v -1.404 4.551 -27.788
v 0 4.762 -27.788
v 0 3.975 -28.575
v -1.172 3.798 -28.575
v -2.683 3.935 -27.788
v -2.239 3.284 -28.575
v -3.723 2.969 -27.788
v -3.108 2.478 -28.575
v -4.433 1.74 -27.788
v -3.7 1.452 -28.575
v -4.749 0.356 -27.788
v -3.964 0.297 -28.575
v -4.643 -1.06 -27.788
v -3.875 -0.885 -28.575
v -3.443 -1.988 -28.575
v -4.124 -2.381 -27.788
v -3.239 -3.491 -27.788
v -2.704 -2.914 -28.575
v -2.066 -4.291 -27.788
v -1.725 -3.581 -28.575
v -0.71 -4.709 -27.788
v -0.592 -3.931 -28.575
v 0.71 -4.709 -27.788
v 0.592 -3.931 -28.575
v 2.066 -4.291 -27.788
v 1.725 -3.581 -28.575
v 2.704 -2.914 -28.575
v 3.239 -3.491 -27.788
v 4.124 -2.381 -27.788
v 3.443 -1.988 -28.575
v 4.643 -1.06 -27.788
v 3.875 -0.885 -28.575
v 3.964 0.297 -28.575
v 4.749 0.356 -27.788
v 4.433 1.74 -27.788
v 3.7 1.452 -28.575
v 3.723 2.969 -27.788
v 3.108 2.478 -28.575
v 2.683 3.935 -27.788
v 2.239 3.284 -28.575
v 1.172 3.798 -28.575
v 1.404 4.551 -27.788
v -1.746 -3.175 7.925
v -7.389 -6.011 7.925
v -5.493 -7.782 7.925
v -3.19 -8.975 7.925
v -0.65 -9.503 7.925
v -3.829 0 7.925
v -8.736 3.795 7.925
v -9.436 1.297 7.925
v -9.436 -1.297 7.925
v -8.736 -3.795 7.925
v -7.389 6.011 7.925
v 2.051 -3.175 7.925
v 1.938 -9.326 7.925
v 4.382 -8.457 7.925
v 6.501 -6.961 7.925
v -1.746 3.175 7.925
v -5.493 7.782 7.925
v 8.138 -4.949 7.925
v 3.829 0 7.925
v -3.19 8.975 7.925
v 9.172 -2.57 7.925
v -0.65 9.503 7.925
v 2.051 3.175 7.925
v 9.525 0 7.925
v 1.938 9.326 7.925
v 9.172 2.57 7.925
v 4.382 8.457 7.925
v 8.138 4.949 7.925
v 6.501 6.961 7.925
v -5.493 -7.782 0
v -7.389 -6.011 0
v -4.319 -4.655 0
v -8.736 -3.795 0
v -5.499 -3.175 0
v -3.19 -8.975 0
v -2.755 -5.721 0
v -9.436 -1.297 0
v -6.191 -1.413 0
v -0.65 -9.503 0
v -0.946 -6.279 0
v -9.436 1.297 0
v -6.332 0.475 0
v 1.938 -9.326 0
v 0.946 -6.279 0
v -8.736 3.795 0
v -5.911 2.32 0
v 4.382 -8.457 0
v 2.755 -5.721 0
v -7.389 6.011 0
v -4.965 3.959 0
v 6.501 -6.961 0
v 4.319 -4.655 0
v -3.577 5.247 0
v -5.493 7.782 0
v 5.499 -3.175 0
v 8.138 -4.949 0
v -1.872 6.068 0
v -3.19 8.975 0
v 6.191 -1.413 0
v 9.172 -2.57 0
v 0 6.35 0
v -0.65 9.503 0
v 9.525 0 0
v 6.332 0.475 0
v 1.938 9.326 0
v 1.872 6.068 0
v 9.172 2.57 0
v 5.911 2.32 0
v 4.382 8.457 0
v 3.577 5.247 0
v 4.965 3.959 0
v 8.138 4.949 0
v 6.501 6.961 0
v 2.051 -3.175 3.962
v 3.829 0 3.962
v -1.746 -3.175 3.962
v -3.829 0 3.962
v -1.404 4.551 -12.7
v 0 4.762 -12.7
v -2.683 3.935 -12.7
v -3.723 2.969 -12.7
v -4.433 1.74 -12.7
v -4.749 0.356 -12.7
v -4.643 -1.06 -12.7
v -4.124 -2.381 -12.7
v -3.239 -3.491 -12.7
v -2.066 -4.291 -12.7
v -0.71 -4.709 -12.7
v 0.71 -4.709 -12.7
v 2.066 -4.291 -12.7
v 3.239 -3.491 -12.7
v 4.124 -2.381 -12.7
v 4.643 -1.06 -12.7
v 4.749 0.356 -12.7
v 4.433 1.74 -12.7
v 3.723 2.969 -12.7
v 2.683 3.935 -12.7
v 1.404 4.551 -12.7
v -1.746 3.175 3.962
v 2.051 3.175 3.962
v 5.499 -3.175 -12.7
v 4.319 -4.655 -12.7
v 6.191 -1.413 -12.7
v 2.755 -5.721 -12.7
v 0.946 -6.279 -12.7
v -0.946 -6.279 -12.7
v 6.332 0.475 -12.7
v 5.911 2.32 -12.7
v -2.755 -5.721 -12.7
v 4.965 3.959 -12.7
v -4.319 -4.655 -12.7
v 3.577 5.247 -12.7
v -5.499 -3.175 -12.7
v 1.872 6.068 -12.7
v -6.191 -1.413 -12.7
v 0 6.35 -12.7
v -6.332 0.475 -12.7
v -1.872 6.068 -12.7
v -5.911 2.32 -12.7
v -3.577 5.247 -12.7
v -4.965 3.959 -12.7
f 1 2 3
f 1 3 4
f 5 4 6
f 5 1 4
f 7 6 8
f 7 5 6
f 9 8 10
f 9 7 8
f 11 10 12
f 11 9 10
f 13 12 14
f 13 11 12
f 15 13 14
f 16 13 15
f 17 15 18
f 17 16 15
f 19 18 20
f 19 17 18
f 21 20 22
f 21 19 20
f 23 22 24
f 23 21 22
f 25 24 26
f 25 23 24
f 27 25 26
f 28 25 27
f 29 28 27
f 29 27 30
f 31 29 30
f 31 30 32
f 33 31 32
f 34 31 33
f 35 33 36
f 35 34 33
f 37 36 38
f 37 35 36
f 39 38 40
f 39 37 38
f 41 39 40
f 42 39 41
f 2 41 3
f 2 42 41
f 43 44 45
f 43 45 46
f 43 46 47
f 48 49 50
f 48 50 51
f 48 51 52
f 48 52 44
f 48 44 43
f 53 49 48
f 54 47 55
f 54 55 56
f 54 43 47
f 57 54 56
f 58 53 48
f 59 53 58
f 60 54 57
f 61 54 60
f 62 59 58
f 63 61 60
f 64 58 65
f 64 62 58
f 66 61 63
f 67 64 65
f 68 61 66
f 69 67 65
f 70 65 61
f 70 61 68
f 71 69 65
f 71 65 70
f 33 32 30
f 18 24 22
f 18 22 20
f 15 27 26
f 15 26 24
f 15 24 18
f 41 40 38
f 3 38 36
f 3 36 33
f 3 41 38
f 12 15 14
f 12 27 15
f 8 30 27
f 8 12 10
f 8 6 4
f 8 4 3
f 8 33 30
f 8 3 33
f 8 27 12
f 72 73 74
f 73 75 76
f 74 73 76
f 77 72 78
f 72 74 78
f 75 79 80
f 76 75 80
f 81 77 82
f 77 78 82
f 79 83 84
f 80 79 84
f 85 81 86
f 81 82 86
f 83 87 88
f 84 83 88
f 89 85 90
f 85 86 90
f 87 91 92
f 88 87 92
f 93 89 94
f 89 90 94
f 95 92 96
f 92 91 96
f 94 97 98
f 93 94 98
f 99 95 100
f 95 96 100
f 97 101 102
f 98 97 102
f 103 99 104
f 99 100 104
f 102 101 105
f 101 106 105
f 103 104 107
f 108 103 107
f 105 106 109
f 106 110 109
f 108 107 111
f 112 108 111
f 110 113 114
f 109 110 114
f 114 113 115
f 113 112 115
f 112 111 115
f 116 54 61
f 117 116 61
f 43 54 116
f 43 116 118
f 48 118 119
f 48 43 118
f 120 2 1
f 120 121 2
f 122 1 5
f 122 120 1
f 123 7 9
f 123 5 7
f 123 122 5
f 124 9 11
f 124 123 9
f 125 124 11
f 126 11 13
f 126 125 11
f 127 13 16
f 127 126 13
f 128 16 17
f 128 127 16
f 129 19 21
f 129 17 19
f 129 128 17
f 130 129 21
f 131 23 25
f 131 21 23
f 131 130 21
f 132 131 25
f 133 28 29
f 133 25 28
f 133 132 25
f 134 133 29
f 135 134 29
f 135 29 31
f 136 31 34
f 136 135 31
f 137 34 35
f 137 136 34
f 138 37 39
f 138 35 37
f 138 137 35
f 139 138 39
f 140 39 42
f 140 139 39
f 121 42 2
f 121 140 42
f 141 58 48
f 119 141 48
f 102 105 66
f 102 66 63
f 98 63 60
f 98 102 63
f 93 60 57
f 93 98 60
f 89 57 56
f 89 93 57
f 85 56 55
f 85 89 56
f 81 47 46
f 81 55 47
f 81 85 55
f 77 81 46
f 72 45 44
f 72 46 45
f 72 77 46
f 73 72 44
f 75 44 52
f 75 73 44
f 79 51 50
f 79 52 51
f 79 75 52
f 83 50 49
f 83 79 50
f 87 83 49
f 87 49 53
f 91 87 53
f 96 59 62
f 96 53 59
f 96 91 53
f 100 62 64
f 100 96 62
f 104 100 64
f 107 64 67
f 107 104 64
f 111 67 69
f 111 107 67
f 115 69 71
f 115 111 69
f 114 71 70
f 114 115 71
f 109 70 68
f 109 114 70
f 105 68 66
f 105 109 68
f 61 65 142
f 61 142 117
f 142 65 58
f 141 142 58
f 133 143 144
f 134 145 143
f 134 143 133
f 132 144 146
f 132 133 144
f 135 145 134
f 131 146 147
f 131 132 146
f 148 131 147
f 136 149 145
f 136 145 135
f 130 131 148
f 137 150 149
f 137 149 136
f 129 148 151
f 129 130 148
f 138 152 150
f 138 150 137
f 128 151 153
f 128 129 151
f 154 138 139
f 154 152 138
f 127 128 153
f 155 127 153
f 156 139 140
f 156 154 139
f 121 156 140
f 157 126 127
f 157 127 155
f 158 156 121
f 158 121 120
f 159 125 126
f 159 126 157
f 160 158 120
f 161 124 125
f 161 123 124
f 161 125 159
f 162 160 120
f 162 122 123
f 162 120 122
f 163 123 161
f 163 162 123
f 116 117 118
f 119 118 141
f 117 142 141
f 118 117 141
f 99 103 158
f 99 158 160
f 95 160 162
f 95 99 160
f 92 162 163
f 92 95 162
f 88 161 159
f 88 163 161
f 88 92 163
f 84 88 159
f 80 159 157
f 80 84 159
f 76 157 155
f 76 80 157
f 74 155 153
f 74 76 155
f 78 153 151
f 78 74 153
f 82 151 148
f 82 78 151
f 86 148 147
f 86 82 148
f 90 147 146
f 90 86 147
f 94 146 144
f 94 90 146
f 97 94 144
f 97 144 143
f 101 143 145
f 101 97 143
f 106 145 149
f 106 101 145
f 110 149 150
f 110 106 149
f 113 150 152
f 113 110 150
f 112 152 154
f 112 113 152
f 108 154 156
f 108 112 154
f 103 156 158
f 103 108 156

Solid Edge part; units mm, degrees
sketch "Sketch1" plane through (0, 0, 0) normal (0, 0, 1) x (1, 0, 0)
  circle A0 centre (0, 0) radius 9.525
  dimension "D1" = 19.05
extrude "Protrusion1" add sketch "Sketch1" along normal blind 7.9248
sketch "Sketch2" plane through (0, 0, 0) normal (0, 0, -1) x (0, 1, 0)
  circle A0 centre (0, 0) radius 6.35
  dimension "D1" = 12.7
extrude "Protrusion2" add sketch "Sketch2" along normal blind 12.7
sketch "Sketch3" plane through (0, 0, -12.7) normal (0, 0, -1) x (0, 1, 0)
  circle A0 centre (0, 0) radius 4.7625
  dimension "D1" = 9.525
extrude "Protrusion3" add sketch "Sketch3" along normal blind 15.875
sketch "Sketch4" plane through (0, 0, 7.9248) normal (0, 0, 1) x (0, 1, 0)
  line L0 (-3.175, 1.7461) -> (0, 3.8287)
  line L1 (-3.175, -2.051) -> (-3.175, 1.7461)
  line L2 (-3.175, -2.051) -> (0, -3.8287)
  line L3 (3.175, -2.051) -> (0, -3.8287)
  line L4 (3.175, -2.051) -> (3.175, 1.7461)
  line L5 (3.175, 1.7461) -> (0, 3.8287)
  dimension "D1" = 6.35
extrude "Cutout1" cut sketch "Sketch4" against normal blind 3.9624
chamfer "Chamfer1" distance 0.7874 angle 45 1 edges at (0, -4.7625, -28.575)
properties part number "55030020"
